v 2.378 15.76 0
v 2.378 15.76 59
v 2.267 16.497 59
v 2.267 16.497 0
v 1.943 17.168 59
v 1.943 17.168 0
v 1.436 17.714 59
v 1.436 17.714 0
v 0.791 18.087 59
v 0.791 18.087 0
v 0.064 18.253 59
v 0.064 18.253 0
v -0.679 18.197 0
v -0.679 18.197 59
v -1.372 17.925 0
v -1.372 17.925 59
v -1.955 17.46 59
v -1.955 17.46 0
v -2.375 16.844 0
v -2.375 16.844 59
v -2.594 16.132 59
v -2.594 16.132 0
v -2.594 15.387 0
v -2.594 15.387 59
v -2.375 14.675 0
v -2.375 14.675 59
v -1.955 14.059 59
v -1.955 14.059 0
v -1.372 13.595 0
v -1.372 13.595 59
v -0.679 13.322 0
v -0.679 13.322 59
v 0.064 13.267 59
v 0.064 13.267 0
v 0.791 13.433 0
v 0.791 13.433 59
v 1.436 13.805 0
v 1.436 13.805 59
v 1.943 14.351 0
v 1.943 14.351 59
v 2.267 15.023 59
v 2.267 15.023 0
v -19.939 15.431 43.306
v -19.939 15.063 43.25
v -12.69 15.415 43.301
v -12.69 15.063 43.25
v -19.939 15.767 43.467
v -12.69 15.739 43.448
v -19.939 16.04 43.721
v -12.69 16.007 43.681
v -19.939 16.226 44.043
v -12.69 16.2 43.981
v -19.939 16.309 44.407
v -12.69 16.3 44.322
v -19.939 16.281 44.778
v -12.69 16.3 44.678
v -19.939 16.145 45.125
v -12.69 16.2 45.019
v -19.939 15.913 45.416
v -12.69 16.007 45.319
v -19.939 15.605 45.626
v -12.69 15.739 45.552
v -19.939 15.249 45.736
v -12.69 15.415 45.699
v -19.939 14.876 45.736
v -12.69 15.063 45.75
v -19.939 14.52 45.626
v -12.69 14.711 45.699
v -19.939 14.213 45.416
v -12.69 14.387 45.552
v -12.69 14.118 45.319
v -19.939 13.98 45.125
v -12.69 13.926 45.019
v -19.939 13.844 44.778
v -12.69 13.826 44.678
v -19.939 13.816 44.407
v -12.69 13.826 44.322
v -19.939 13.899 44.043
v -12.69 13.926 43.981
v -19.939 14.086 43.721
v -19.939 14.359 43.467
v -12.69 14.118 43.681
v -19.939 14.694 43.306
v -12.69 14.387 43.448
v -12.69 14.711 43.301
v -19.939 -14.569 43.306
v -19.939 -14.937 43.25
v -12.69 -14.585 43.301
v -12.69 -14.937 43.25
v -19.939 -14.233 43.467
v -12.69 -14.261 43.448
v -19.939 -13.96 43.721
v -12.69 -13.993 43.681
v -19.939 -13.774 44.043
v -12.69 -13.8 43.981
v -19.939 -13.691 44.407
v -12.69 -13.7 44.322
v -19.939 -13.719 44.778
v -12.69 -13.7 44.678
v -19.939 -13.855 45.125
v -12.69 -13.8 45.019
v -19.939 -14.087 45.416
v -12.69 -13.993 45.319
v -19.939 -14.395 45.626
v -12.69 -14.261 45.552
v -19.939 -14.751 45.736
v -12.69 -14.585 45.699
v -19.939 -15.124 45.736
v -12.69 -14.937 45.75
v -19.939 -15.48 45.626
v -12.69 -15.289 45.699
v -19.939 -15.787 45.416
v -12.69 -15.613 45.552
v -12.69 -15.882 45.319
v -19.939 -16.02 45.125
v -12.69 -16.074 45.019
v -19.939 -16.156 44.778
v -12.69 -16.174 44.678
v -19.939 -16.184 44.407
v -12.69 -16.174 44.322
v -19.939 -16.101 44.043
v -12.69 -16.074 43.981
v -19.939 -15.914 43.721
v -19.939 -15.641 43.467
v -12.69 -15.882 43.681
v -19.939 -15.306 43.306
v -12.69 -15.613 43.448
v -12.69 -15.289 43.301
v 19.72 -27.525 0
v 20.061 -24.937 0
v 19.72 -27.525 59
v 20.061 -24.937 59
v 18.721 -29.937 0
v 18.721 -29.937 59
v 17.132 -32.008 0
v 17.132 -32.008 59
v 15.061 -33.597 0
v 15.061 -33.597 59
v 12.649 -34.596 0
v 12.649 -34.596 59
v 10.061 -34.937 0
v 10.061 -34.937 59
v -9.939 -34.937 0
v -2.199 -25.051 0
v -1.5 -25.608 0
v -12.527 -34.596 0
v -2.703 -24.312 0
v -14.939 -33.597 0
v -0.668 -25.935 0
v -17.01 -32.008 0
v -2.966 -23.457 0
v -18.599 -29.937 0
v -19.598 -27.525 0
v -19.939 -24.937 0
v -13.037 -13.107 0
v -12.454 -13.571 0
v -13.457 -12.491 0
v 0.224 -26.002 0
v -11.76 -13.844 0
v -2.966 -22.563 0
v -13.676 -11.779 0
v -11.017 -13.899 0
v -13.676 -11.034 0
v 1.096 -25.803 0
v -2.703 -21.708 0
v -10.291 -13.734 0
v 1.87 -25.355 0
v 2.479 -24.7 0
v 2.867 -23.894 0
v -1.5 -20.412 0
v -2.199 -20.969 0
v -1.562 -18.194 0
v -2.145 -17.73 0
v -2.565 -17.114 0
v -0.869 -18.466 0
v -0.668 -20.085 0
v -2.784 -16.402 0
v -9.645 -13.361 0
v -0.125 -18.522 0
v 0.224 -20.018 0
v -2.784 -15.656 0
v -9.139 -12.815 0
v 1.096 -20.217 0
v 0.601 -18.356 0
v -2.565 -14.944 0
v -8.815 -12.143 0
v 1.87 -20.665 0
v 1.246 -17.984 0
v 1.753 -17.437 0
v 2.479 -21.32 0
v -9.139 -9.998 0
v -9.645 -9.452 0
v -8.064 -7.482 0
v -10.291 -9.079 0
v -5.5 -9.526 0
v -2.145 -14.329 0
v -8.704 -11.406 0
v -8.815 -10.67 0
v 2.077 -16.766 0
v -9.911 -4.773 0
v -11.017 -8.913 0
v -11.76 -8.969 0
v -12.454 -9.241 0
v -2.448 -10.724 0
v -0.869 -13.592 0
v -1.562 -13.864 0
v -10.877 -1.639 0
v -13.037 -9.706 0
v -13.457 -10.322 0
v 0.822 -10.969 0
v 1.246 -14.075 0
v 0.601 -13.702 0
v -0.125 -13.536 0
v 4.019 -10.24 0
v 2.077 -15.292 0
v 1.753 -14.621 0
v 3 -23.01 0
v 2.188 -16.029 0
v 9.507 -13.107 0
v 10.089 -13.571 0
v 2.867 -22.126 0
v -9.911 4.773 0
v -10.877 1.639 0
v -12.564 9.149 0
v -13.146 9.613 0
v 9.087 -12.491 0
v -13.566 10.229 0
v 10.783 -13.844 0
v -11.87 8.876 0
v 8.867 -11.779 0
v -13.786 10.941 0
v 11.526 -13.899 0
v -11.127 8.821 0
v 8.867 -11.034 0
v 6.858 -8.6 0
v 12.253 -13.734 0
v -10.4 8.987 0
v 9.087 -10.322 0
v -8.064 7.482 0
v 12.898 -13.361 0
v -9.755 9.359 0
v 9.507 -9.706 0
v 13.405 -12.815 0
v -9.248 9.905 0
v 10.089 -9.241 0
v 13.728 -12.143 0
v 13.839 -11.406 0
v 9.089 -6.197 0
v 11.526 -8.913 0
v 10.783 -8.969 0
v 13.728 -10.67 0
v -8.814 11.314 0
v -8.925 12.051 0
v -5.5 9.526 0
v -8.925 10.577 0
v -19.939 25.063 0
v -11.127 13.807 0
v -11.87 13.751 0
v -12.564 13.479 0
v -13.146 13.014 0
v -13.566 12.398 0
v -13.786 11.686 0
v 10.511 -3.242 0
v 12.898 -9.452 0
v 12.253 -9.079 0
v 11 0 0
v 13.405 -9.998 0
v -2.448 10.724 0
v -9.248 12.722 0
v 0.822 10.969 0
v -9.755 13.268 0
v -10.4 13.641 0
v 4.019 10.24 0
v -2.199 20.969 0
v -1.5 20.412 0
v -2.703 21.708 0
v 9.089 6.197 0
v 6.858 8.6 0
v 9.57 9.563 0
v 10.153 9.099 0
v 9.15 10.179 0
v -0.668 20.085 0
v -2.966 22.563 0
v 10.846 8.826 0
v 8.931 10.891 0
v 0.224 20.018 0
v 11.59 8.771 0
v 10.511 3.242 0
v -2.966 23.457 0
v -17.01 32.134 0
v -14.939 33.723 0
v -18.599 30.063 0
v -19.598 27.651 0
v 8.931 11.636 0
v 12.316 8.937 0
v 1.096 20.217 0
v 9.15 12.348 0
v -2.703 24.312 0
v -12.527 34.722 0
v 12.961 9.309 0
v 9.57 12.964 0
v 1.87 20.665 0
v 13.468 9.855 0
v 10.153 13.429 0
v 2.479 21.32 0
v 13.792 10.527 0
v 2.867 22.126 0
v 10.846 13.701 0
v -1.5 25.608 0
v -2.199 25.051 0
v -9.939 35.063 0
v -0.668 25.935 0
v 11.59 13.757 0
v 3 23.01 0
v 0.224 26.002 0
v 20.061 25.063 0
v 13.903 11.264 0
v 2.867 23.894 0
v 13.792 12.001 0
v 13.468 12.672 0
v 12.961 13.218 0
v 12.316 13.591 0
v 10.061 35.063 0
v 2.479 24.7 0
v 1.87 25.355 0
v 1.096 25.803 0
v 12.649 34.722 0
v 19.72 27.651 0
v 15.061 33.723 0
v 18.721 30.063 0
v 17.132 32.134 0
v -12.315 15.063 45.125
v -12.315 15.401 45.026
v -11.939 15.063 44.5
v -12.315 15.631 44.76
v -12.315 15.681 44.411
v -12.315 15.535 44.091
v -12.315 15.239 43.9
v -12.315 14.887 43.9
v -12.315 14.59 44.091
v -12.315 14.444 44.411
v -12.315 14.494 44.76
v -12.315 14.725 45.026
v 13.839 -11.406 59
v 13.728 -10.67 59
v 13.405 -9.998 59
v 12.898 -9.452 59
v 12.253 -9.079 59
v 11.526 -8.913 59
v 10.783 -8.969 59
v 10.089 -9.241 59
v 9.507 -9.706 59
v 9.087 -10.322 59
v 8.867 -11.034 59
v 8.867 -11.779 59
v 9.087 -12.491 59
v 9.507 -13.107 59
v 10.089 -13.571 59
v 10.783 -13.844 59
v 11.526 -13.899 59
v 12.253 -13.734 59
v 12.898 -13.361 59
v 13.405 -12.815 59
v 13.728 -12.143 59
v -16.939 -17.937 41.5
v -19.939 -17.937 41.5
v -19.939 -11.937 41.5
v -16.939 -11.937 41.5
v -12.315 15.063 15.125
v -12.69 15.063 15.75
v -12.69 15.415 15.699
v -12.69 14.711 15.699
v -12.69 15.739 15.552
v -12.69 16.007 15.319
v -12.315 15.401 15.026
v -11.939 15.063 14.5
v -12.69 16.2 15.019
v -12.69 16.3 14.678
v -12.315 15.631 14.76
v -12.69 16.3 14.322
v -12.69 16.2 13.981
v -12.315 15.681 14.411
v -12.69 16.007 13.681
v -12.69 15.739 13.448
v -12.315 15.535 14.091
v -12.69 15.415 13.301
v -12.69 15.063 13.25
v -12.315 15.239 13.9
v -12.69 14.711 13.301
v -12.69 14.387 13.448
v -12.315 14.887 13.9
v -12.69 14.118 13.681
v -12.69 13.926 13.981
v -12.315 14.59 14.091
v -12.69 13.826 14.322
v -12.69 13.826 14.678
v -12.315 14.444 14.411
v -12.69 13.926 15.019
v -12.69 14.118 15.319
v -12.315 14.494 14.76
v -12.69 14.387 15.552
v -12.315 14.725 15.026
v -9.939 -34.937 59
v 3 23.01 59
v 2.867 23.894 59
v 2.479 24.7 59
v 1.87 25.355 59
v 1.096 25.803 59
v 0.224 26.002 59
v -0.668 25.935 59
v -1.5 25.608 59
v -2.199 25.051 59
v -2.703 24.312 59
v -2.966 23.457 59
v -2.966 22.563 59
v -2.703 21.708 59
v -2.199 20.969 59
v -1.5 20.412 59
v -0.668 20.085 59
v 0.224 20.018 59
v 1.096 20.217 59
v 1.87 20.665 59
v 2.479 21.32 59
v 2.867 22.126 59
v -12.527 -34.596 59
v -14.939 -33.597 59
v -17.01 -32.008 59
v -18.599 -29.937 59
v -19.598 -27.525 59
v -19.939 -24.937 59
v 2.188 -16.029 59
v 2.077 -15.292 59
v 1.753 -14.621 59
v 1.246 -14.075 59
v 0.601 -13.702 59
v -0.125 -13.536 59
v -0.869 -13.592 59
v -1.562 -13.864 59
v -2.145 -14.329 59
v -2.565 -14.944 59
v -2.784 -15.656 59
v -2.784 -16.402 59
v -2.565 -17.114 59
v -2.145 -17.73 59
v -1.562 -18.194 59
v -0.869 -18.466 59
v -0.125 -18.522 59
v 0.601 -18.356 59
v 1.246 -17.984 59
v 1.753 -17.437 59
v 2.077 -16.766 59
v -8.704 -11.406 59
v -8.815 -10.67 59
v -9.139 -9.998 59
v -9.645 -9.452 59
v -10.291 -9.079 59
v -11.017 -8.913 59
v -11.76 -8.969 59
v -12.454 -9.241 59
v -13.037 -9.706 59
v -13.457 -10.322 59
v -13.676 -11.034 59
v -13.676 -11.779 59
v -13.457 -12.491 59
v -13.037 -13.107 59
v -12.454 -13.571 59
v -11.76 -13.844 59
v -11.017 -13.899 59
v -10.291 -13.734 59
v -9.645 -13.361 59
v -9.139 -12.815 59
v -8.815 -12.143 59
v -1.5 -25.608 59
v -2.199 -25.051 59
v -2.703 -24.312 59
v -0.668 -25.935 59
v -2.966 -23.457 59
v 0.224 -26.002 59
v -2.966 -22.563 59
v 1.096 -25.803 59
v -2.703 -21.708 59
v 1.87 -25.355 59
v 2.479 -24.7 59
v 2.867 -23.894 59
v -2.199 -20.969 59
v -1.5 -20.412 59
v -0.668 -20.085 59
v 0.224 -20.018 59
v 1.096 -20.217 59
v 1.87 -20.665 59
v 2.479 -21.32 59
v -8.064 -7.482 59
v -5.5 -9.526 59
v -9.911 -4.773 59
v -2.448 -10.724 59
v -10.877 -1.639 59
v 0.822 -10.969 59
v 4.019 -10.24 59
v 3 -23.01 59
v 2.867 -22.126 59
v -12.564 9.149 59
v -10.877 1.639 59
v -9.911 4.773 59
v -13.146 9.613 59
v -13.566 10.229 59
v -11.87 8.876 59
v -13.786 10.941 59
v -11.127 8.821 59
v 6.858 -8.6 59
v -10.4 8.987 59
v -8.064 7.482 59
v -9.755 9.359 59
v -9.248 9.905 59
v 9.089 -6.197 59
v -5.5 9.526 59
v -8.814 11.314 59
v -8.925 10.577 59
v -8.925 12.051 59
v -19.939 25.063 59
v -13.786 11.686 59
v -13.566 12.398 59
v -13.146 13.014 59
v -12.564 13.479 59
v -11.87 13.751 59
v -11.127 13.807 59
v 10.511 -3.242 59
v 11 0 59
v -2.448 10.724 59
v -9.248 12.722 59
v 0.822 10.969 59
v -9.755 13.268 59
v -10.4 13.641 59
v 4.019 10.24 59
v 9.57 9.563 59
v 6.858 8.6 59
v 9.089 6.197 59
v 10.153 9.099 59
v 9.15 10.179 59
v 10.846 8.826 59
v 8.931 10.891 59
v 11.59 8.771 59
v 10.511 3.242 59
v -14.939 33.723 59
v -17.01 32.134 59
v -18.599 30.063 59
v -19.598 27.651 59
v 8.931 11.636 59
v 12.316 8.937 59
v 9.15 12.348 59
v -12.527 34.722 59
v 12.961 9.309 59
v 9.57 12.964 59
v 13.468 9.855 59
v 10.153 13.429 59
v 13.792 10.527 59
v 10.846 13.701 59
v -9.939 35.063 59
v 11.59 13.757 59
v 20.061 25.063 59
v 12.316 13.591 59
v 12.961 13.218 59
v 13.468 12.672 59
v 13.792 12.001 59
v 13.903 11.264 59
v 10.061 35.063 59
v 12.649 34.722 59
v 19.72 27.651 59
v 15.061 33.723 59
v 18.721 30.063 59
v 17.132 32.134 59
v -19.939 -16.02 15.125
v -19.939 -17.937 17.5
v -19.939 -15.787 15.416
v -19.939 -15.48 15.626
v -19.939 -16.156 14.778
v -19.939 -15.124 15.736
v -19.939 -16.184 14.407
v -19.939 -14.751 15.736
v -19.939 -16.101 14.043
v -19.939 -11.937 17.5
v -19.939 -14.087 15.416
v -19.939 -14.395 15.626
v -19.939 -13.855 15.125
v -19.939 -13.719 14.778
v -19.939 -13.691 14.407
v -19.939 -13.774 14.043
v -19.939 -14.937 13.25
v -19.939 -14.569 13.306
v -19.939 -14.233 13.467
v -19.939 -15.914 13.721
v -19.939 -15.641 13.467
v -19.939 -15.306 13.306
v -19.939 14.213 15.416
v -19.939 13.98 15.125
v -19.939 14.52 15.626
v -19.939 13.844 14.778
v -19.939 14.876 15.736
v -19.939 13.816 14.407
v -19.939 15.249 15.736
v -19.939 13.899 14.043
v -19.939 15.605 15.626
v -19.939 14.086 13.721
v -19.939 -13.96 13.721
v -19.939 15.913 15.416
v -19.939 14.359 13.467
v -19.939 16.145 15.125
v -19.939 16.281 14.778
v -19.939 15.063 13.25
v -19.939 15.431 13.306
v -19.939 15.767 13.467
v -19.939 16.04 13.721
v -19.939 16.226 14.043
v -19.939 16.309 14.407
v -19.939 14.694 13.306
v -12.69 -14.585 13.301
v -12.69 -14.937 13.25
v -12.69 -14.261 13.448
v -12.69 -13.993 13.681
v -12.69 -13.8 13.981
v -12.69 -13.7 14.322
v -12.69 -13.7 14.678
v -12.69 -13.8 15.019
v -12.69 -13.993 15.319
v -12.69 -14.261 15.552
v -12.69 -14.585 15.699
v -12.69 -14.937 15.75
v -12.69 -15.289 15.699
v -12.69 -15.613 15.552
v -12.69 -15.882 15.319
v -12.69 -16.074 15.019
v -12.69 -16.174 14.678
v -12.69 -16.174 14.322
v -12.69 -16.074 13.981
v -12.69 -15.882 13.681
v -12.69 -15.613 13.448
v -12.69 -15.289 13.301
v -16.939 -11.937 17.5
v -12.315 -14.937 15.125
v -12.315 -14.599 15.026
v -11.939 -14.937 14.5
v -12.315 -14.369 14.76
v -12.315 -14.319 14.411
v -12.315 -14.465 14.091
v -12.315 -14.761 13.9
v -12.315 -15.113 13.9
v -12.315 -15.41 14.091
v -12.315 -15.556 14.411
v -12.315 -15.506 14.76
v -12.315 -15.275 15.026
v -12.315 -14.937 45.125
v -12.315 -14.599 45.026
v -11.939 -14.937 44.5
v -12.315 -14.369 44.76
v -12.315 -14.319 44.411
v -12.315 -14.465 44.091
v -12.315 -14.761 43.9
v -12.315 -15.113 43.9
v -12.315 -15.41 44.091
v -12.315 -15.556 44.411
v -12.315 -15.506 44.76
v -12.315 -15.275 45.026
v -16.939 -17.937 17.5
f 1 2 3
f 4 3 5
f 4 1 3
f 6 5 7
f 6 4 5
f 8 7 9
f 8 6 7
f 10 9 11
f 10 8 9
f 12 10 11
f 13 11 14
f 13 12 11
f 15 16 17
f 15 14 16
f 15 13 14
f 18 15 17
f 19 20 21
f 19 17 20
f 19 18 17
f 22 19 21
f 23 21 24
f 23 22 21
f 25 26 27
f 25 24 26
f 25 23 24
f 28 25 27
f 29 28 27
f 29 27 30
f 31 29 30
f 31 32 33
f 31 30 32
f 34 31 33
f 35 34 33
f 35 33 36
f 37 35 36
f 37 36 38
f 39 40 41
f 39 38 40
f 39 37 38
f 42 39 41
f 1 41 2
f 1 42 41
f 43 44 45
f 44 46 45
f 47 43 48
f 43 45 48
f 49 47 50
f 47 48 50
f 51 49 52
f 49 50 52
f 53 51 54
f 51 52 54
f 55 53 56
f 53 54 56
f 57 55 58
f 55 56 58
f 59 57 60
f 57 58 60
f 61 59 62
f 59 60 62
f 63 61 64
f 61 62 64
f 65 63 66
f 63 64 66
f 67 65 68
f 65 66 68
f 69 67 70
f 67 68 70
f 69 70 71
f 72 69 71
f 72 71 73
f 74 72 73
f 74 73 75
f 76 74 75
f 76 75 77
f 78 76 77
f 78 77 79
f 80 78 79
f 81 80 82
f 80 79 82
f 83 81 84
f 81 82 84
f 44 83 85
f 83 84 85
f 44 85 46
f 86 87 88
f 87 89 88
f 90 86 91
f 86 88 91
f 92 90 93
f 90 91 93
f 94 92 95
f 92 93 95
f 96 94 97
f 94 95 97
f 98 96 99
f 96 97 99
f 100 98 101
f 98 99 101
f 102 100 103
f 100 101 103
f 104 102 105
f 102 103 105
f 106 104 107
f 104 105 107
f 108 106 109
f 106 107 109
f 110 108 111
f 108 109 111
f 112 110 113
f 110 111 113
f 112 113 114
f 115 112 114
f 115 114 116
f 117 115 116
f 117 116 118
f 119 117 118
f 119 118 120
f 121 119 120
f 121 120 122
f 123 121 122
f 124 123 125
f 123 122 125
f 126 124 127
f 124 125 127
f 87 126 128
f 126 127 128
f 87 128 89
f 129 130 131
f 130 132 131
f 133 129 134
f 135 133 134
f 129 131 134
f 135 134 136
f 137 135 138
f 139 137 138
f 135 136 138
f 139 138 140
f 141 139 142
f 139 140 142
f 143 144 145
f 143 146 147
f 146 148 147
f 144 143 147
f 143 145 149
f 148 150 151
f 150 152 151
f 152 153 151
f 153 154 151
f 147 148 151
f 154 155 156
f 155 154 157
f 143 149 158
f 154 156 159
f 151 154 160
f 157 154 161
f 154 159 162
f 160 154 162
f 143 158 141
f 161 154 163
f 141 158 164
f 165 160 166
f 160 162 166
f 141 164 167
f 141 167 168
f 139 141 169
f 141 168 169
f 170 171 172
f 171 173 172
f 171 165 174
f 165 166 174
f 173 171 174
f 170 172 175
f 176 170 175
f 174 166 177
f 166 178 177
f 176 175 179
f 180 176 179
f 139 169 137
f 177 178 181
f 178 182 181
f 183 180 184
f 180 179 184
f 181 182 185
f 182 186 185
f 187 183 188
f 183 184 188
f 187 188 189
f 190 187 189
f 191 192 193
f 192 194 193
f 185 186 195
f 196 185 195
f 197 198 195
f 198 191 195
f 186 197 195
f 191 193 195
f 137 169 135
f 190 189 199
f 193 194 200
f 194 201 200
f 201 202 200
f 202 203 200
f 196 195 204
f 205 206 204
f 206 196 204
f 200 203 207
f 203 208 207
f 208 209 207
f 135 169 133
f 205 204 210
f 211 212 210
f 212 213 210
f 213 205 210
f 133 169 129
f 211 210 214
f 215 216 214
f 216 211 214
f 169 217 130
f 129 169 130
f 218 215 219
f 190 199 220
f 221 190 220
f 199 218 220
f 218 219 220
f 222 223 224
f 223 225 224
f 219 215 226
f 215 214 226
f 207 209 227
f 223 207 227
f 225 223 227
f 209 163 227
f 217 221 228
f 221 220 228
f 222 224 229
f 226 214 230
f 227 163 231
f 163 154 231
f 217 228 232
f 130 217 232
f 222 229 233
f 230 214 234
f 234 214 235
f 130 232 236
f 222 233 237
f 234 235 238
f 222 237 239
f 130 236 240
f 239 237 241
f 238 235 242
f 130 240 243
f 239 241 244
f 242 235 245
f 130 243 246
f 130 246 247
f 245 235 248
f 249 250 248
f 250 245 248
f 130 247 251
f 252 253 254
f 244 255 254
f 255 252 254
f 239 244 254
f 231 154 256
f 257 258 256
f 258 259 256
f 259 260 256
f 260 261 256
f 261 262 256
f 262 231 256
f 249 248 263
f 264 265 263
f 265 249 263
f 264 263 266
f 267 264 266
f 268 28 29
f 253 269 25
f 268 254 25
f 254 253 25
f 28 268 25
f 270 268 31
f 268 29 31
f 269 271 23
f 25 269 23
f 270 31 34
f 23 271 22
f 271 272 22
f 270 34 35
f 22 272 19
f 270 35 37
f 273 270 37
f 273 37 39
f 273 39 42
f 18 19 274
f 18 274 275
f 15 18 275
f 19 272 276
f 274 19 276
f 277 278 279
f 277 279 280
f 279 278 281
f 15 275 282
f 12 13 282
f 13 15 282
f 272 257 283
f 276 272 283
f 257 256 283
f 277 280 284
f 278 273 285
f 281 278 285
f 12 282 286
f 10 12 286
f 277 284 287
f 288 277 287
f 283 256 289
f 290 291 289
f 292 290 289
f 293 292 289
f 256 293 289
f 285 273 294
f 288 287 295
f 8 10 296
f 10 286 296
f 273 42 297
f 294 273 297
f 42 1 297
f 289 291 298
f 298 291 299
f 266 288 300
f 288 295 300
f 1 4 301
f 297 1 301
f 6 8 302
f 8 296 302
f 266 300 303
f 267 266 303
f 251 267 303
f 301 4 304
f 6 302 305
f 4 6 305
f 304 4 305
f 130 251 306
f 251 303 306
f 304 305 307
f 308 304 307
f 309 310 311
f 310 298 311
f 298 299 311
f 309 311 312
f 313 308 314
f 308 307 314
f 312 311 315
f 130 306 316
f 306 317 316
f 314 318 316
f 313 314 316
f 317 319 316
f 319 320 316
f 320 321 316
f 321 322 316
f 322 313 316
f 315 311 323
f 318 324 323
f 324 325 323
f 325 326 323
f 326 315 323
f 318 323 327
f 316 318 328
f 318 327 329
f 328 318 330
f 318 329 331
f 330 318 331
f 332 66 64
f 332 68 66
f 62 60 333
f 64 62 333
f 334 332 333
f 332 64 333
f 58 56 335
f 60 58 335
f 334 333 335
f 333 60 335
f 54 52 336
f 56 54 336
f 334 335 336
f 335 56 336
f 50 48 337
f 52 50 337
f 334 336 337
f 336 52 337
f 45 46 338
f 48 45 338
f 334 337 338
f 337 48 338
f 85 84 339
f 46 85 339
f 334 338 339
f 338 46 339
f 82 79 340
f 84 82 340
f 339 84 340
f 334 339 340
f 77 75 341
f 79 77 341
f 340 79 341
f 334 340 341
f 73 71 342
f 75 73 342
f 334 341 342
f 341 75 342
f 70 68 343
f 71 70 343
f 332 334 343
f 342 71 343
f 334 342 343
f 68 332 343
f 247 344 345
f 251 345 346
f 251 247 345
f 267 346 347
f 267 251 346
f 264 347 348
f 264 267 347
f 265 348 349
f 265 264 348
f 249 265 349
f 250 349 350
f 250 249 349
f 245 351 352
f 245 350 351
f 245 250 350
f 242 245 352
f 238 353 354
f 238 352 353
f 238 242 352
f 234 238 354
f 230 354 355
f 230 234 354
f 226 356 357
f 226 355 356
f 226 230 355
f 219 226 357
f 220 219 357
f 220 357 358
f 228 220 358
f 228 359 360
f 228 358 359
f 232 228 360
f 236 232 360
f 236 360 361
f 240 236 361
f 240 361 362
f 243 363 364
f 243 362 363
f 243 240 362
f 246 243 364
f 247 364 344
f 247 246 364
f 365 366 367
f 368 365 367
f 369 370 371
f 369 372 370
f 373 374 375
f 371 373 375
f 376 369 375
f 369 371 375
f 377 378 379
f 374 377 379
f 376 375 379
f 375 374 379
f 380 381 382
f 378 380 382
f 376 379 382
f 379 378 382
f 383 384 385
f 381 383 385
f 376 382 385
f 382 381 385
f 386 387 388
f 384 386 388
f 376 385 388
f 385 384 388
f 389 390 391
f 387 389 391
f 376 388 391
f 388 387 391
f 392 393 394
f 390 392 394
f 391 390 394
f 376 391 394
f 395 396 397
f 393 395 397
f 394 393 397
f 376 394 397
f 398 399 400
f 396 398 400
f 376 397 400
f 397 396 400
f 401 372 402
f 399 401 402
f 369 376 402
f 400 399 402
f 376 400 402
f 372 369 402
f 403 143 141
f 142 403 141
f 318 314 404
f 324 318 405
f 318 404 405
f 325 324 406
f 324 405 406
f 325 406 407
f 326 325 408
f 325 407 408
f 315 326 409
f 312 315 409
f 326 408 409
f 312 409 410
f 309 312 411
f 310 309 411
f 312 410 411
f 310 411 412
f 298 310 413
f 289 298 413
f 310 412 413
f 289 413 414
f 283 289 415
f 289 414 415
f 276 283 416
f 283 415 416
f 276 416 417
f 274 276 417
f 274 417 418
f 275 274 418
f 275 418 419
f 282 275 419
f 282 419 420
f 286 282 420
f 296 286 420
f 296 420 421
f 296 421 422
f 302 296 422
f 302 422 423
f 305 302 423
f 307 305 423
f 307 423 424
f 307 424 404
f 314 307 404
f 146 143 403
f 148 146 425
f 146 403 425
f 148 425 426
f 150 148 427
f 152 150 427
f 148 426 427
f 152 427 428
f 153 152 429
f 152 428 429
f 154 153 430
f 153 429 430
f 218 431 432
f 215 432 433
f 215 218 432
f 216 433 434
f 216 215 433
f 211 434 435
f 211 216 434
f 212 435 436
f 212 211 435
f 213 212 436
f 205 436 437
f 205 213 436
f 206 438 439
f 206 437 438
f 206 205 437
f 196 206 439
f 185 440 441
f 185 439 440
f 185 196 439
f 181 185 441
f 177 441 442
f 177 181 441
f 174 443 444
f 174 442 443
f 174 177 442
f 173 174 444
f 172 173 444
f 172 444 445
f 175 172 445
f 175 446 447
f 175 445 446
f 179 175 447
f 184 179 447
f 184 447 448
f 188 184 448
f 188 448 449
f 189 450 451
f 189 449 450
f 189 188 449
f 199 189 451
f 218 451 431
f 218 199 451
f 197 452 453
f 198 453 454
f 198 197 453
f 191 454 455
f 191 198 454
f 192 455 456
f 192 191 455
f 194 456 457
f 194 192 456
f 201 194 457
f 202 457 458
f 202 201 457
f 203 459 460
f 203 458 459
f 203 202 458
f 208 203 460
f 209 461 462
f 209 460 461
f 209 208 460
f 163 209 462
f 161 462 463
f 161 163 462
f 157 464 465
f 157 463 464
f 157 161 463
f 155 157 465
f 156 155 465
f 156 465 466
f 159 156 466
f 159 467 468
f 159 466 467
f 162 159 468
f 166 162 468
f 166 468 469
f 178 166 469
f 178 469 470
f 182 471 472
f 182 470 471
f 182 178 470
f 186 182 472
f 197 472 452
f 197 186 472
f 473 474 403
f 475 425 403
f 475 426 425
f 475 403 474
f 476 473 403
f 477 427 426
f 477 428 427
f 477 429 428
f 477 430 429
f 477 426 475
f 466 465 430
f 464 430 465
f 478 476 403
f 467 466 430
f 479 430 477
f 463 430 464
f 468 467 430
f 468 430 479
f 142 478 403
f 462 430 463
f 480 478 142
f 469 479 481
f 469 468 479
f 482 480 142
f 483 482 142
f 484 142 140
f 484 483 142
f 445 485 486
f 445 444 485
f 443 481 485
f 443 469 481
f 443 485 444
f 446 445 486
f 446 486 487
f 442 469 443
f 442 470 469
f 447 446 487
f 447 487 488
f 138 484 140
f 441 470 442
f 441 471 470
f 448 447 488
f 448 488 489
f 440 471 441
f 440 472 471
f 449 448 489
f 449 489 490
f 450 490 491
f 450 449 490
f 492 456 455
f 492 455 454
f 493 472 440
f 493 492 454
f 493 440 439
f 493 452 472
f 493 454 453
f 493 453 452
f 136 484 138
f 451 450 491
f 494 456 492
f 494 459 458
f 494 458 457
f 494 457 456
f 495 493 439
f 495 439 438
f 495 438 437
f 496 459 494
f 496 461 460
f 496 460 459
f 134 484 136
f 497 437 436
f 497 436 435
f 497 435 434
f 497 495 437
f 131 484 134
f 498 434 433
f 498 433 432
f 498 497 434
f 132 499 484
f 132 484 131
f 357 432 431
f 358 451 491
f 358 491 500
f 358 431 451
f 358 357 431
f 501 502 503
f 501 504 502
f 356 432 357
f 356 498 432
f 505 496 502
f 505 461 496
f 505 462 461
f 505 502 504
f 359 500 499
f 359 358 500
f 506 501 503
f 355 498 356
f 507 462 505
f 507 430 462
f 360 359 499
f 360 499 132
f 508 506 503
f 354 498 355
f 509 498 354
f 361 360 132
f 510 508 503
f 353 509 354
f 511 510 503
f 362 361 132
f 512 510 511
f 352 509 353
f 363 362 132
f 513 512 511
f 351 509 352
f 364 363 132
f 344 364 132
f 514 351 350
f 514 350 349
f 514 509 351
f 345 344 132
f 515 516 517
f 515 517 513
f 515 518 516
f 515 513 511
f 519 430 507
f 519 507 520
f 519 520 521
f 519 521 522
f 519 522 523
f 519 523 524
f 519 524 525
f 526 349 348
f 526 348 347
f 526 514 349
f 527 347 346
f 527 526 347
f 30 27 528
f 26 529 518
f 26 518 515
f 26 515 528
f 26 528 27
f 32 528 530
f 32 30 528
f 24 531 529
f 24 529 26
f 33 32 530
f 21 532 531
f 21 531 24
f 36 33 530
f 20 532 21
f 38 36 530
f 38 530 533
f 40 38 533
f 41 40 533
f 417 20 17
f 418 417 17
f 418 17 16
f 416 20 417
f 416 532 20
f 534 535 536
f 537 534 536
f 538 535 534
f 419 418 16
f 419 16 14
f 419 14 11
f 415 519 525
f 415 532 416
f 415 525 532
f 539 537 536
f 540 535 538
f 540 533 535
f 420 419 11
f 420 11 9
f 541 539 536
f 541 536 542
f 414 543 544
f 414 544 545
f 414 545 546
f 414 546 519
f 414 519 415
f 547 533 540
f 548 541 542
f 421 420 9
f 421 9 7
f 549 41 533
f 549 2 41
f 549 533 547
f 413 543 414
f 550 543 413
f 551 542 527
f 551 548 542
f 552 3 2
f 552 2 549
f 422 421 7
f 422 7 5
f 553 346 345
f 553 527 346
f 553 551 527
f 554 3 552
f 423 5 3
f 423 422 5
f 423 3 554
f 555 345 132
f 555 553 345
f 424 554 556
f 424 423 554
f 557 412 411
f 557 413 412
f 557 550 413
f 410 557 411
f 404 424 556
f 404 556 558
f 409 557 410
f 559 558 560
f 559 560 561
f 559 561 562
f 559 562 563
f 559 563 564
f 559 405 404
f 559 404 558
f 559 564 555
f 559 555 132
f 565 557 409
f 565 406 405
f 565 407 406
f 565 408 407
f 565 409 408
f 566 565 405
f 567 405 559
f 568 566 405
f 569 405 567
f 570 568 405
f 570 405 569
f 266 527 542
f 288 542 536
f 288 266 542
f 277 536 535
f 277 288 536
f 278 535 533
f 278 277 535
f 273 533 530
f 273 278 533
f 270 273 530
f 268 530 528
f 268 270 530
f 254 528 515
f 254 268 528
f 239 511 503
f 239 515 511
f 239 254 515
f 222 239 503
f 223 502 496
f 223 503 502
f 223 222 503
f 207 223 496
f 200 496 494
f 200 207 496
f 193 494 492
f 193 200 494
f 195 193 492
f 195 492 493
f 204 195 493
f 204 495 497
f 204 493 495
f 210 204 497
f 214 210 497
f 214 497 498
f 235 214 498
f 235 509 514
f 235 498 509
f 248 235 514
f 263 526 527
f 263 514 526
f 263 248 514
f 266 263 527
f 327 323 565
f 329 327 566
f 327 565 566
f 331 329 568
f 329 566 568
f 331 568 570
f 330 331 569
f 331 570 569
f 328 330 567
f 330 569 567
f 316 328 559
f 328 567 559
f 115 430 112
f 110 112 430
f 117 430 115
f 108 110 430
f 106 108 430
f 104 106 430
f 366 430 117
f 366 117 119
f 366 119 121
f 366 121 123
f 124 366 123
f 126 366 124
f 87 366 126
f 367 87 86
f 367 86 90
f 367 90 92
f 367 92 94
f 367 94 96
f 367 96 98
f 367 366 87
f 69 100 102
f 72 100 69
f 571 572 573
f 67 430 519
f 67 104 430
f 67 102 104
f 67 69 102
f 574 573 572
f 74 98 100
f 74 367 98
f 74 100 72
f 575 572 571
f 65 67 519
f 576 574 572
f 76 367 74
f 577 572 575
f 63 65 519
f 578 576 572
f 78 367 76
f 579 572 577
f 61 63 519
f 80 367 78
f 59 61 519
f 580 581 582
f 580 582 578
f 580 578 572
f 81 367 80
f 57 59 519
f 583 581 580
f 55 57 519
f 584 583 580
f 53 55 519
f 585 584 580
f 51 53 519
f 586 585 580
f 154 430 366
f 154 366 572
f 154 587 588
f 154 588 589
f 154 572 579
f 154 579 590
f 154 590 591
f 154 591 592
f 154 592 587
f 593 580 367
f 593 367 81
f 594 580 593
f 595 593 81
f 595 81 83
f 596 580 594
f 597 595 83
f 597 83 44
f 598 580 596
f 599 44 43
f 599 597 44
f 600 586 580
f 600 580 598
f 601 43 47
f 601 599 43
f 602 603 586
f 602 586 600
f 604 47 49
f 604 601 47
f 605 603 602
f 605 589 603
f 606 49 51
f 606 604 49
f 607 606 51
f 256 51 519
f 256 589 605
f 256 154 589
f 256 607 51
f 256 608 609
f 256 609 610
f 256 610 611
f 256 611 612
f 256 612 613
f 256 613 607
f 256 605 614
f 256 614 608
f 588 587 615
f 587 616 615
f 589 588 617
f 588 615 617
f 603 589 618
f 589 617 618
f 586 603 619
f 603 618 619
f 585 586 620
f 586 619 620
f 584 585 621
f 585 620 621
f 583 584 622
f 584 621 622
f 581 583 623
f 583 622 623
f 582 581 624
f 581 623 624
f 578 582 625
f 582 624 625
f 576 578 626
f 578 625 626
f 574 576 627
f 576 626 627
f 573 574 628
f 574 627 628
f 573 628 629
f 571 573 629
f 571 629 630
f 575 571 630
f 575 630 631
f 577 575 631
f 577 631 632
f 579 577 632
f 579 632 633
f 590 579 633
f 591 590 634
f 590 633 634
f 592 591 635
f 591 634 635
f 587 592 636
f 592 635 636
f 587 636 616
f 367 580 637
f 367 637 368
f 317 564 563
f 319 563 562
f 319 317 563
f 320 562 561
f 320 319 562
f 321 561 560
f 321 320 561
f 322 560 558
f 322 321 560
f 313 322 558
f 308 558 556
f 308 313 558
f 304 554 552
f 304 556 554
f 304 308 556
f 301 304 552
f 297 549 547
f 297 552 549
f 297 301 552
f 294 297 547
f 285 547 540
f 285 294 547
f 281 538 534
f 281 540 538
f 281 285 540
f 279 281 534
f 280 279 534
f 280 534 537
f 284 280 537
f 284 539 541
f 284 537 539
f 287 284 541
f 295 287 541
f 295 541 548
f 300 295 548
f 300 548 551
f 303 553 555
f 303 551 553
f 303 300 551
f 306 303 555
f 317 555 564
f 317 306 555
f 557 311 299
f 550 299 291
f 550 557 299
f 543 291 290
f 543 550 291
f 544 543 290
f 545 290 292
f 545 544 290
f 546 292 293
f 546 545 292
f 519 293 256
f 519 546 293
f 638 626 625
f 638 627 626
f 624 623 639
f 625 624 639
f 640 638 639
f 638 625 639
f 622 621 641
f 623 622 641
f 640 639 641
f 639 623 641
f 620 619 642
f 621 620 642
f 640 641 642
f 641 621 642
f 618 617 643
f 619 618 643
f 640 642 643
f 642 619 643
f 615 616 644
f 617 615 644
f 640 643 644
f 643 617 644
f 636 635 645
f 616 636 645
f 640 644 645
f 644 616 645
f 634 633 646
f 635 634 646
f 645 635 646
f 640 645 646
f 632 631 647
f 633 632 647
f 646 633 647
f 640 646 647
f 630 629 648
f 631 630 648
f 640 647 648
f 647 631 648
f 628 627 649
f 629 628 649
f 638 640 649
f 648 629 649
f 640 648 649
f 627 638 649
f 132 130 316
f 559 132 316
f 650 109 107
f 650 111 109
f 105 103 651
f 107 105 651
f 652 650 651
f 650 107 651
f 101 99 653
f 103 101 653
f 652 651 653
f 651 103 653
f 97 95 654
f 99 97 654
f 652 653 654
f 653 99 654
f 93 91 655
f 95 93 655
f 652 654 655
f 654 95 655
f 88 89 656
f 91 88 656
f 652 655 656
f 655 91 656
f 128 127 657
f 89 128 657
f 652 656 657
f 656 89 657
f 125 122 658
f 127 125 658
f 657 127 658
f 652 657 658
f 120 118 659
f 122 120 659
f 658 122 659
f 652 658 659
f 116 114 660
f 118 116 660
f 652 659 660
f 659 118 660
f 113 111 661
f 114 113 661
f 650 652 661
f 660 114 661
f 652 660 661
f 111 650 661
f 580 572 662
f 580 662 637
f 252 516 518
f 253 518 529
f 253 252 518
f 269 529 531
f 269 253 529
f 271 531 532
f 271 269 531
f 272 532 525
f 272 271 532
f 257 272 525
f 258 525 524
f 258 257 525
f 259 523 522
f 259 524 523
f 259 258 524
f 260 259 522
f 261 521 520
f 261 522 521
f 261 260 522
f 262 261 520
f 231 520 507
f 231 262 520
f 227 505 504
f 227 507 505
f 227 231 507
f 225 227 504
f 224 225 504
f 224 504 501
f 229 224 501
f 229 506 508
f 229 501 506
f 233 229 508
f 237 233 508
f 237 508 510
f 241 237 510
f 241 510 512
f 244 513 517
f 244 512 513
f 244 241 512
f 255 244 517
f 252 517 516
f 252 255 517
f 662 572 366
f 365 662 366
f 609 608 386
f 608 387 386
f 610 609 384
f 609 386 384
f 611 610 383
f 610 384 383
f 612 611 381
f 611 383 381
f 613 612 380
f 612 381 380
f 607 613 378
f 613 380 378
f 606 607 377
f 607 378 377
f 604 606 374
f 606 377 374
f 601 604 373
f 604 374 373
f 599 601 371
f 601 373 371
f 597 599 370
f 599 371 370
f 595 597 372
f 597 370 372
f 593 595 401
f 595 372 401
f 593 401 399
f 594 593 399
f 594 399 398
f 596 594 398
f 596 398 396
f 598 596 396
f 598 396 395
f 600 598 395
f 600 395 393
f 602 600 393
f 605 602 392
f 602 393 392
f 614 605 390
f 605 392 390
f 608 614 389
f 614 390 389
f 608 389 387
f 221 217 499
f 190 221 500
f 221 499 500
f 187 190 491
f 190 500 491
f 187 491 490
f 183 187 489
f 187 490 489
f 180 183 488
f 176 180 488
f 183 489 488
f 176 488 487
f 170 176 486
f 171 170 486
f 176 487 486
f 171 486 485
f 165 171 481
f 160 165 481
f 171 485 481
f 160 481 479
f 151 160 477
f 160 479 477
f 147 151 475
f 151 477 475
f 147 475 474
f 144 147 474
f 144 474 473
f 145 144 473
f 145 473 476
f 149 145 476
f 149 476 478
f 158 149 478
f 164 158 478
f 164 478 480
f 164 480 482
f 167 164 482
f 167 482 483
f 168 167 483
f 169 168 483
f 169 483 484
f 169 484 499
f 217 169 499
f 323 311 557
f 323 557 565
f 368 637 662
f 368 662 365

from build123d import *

# Parameters (mm, degrees)
SKETCH1_W                      = 40
SKETCH1_H                      = 70
BOSS_EXTRUDE1_DEPTH            = 59
SKETCH2_R                      = 11
SKETCH2_R_2                    = 2.5
CUT_EXTRUDE1_DEPTH             = 72.504101247
F_2_5_2_5_DIAMETER_HOLE1_D     = 2.5
F_2_5_2_5_DIAMETER_HOLE1_DEPTH = 7.248924226
F_2_5_2_5_DIAMETER_HOLE1_TIP   = 0.751075774
SKETCH5_W                      = 24
SKETCH5_H                      = 6
CUT_EXTRUDE2_DEPTH             = 3
FILLET2_R                      = 10
FILLET3_R                      = 10
FILLET4_R                      = 10
FILLET5_R                      = 10
SKETCH9_R                      = 3
CUT_EXTRUDE3_DEPTH             = 72.504101247


with BuildPart() as part:
    # Sketch1 → Boss-Extrude1 (new body)
    with BuildSketch(Plane.XY):
        with Locations((0.060830656, 0.062794648)):
            Rectangle(SKETCH1_W, SKETCH1_H)
    extrude(amount=BOSS_EXTRUDE1_DEPTH)

    # Sketch2 → Cut-Extrude1 (cut, through all)
    with BuildSketch(Plane.XY):
        Circle(SKETCH2_R)
        with Locations((-11.313708499, 11.313708499)):
            Circle(SKETCH2_R_2)
        with Locations((-0.122338904, 15.759725587)):
            Circle(SKETCH2_R_2)
        with Locations((11.402693442, 11.263696484)):
            Circle(SKETCH2_R_2)
        with Locations((11.339369089, -11.406422087)):
            Circle(SKETCH2_R_2)
        with Locations((-0.312311964, -16.029099896)):
            Circle(SKETCH2_R_2)
        with Locations((-11.204100775, -11.406422087)):
            Circle(SKETCH2_R_2)
    extrude(amount=CUT_EXTRUDE1_DEPTH, mode=Mode.SUBTRACT)

    # Ø2.5 (2.5) Diameter Hole1
    with Locations(Plane.ZY.offset(19.939169344)):
        with Locations((14.5, 15.062794648), (44.5, 15.062794648), (44.5, -14.937205352), (14.5, -14.937205352)):
            Hole(F_2_5_2_5_DIAMETER_HOLE1_D / 2, depth=F_2_5_2_5_DIAMETER_HOLE1_DEPTH)
            with Locations((0, 0, -(F_2_5_2_5_DIAMETER_HOLE1_DEPTH + F_2_5_2_5_DIAMETER_HOLE1_TIP / 2))):  # 118° drill point
                Cone(0, F_2_5_2_5_DIAMETER_HOLE1_D / 2, F_2_5_2_5_DIAMETER_HOLE1_TIP, mode=Mode.SUBTRACT)

    # Sketch5 → Cut-Extrude2 (cut)
    with BuildSketch(Plane.ZY.offset(19.939169344)):
        with Locations((29.5, -14.937205352)):
            Rectangle(SKETCH5_W, SKETCH5_H)
    extrude(amount=-CUT_EXTRUDE2_DEPTH, mode=Mode.SUBTRACT)

    # Fillet2
    fillet2_edges = [part.edges().sort_by_distance(p)[0] for p in [
        (20.060830656, 35.062794648, 29.5),
    ]]
    fillet(fillet2_edges, radius=FILLET2_R)

    # Fillet3
    fillet3_edges = [part.edges().sort_by_distance(p)[0] for p in [
        (-19.939169344, 35.062794648, 29.5),
    ]]
    fillet(fillet3_edges, radius=FILLET3_R)

    # Fillet4
    fillet4_edges = [part.edges().sort_by_distance(p)[0] for p in [
        (20.060830656, -34.937205352, 29.5),
    ]]
    fillet(fillet4_edges, radius=FILLET4_R)

    # Fillet5
    fillet5_edges = [part.edges().sort_by_distance(p)[0] for p in [
        (-19.939169344, -34.937205352, 29.5),
    ]]
    fillet(fillet5_edges, radius=FILLET5_R)

    # Sketch9 → Cut-Extrude3 (cut, through all)
    with BuildSketch(Plane.XY.offset(59)):
        with Locations((0, 23.01)):
            Circle(SKETCH9_R)
        with Locations((0, -23.01)):
            Circle(SKETCH9_R)
    extrude(amount=-CUT_EXTRUDE3_DEPTH, mode=Mode.SUBTRACT)


solid = part.part
